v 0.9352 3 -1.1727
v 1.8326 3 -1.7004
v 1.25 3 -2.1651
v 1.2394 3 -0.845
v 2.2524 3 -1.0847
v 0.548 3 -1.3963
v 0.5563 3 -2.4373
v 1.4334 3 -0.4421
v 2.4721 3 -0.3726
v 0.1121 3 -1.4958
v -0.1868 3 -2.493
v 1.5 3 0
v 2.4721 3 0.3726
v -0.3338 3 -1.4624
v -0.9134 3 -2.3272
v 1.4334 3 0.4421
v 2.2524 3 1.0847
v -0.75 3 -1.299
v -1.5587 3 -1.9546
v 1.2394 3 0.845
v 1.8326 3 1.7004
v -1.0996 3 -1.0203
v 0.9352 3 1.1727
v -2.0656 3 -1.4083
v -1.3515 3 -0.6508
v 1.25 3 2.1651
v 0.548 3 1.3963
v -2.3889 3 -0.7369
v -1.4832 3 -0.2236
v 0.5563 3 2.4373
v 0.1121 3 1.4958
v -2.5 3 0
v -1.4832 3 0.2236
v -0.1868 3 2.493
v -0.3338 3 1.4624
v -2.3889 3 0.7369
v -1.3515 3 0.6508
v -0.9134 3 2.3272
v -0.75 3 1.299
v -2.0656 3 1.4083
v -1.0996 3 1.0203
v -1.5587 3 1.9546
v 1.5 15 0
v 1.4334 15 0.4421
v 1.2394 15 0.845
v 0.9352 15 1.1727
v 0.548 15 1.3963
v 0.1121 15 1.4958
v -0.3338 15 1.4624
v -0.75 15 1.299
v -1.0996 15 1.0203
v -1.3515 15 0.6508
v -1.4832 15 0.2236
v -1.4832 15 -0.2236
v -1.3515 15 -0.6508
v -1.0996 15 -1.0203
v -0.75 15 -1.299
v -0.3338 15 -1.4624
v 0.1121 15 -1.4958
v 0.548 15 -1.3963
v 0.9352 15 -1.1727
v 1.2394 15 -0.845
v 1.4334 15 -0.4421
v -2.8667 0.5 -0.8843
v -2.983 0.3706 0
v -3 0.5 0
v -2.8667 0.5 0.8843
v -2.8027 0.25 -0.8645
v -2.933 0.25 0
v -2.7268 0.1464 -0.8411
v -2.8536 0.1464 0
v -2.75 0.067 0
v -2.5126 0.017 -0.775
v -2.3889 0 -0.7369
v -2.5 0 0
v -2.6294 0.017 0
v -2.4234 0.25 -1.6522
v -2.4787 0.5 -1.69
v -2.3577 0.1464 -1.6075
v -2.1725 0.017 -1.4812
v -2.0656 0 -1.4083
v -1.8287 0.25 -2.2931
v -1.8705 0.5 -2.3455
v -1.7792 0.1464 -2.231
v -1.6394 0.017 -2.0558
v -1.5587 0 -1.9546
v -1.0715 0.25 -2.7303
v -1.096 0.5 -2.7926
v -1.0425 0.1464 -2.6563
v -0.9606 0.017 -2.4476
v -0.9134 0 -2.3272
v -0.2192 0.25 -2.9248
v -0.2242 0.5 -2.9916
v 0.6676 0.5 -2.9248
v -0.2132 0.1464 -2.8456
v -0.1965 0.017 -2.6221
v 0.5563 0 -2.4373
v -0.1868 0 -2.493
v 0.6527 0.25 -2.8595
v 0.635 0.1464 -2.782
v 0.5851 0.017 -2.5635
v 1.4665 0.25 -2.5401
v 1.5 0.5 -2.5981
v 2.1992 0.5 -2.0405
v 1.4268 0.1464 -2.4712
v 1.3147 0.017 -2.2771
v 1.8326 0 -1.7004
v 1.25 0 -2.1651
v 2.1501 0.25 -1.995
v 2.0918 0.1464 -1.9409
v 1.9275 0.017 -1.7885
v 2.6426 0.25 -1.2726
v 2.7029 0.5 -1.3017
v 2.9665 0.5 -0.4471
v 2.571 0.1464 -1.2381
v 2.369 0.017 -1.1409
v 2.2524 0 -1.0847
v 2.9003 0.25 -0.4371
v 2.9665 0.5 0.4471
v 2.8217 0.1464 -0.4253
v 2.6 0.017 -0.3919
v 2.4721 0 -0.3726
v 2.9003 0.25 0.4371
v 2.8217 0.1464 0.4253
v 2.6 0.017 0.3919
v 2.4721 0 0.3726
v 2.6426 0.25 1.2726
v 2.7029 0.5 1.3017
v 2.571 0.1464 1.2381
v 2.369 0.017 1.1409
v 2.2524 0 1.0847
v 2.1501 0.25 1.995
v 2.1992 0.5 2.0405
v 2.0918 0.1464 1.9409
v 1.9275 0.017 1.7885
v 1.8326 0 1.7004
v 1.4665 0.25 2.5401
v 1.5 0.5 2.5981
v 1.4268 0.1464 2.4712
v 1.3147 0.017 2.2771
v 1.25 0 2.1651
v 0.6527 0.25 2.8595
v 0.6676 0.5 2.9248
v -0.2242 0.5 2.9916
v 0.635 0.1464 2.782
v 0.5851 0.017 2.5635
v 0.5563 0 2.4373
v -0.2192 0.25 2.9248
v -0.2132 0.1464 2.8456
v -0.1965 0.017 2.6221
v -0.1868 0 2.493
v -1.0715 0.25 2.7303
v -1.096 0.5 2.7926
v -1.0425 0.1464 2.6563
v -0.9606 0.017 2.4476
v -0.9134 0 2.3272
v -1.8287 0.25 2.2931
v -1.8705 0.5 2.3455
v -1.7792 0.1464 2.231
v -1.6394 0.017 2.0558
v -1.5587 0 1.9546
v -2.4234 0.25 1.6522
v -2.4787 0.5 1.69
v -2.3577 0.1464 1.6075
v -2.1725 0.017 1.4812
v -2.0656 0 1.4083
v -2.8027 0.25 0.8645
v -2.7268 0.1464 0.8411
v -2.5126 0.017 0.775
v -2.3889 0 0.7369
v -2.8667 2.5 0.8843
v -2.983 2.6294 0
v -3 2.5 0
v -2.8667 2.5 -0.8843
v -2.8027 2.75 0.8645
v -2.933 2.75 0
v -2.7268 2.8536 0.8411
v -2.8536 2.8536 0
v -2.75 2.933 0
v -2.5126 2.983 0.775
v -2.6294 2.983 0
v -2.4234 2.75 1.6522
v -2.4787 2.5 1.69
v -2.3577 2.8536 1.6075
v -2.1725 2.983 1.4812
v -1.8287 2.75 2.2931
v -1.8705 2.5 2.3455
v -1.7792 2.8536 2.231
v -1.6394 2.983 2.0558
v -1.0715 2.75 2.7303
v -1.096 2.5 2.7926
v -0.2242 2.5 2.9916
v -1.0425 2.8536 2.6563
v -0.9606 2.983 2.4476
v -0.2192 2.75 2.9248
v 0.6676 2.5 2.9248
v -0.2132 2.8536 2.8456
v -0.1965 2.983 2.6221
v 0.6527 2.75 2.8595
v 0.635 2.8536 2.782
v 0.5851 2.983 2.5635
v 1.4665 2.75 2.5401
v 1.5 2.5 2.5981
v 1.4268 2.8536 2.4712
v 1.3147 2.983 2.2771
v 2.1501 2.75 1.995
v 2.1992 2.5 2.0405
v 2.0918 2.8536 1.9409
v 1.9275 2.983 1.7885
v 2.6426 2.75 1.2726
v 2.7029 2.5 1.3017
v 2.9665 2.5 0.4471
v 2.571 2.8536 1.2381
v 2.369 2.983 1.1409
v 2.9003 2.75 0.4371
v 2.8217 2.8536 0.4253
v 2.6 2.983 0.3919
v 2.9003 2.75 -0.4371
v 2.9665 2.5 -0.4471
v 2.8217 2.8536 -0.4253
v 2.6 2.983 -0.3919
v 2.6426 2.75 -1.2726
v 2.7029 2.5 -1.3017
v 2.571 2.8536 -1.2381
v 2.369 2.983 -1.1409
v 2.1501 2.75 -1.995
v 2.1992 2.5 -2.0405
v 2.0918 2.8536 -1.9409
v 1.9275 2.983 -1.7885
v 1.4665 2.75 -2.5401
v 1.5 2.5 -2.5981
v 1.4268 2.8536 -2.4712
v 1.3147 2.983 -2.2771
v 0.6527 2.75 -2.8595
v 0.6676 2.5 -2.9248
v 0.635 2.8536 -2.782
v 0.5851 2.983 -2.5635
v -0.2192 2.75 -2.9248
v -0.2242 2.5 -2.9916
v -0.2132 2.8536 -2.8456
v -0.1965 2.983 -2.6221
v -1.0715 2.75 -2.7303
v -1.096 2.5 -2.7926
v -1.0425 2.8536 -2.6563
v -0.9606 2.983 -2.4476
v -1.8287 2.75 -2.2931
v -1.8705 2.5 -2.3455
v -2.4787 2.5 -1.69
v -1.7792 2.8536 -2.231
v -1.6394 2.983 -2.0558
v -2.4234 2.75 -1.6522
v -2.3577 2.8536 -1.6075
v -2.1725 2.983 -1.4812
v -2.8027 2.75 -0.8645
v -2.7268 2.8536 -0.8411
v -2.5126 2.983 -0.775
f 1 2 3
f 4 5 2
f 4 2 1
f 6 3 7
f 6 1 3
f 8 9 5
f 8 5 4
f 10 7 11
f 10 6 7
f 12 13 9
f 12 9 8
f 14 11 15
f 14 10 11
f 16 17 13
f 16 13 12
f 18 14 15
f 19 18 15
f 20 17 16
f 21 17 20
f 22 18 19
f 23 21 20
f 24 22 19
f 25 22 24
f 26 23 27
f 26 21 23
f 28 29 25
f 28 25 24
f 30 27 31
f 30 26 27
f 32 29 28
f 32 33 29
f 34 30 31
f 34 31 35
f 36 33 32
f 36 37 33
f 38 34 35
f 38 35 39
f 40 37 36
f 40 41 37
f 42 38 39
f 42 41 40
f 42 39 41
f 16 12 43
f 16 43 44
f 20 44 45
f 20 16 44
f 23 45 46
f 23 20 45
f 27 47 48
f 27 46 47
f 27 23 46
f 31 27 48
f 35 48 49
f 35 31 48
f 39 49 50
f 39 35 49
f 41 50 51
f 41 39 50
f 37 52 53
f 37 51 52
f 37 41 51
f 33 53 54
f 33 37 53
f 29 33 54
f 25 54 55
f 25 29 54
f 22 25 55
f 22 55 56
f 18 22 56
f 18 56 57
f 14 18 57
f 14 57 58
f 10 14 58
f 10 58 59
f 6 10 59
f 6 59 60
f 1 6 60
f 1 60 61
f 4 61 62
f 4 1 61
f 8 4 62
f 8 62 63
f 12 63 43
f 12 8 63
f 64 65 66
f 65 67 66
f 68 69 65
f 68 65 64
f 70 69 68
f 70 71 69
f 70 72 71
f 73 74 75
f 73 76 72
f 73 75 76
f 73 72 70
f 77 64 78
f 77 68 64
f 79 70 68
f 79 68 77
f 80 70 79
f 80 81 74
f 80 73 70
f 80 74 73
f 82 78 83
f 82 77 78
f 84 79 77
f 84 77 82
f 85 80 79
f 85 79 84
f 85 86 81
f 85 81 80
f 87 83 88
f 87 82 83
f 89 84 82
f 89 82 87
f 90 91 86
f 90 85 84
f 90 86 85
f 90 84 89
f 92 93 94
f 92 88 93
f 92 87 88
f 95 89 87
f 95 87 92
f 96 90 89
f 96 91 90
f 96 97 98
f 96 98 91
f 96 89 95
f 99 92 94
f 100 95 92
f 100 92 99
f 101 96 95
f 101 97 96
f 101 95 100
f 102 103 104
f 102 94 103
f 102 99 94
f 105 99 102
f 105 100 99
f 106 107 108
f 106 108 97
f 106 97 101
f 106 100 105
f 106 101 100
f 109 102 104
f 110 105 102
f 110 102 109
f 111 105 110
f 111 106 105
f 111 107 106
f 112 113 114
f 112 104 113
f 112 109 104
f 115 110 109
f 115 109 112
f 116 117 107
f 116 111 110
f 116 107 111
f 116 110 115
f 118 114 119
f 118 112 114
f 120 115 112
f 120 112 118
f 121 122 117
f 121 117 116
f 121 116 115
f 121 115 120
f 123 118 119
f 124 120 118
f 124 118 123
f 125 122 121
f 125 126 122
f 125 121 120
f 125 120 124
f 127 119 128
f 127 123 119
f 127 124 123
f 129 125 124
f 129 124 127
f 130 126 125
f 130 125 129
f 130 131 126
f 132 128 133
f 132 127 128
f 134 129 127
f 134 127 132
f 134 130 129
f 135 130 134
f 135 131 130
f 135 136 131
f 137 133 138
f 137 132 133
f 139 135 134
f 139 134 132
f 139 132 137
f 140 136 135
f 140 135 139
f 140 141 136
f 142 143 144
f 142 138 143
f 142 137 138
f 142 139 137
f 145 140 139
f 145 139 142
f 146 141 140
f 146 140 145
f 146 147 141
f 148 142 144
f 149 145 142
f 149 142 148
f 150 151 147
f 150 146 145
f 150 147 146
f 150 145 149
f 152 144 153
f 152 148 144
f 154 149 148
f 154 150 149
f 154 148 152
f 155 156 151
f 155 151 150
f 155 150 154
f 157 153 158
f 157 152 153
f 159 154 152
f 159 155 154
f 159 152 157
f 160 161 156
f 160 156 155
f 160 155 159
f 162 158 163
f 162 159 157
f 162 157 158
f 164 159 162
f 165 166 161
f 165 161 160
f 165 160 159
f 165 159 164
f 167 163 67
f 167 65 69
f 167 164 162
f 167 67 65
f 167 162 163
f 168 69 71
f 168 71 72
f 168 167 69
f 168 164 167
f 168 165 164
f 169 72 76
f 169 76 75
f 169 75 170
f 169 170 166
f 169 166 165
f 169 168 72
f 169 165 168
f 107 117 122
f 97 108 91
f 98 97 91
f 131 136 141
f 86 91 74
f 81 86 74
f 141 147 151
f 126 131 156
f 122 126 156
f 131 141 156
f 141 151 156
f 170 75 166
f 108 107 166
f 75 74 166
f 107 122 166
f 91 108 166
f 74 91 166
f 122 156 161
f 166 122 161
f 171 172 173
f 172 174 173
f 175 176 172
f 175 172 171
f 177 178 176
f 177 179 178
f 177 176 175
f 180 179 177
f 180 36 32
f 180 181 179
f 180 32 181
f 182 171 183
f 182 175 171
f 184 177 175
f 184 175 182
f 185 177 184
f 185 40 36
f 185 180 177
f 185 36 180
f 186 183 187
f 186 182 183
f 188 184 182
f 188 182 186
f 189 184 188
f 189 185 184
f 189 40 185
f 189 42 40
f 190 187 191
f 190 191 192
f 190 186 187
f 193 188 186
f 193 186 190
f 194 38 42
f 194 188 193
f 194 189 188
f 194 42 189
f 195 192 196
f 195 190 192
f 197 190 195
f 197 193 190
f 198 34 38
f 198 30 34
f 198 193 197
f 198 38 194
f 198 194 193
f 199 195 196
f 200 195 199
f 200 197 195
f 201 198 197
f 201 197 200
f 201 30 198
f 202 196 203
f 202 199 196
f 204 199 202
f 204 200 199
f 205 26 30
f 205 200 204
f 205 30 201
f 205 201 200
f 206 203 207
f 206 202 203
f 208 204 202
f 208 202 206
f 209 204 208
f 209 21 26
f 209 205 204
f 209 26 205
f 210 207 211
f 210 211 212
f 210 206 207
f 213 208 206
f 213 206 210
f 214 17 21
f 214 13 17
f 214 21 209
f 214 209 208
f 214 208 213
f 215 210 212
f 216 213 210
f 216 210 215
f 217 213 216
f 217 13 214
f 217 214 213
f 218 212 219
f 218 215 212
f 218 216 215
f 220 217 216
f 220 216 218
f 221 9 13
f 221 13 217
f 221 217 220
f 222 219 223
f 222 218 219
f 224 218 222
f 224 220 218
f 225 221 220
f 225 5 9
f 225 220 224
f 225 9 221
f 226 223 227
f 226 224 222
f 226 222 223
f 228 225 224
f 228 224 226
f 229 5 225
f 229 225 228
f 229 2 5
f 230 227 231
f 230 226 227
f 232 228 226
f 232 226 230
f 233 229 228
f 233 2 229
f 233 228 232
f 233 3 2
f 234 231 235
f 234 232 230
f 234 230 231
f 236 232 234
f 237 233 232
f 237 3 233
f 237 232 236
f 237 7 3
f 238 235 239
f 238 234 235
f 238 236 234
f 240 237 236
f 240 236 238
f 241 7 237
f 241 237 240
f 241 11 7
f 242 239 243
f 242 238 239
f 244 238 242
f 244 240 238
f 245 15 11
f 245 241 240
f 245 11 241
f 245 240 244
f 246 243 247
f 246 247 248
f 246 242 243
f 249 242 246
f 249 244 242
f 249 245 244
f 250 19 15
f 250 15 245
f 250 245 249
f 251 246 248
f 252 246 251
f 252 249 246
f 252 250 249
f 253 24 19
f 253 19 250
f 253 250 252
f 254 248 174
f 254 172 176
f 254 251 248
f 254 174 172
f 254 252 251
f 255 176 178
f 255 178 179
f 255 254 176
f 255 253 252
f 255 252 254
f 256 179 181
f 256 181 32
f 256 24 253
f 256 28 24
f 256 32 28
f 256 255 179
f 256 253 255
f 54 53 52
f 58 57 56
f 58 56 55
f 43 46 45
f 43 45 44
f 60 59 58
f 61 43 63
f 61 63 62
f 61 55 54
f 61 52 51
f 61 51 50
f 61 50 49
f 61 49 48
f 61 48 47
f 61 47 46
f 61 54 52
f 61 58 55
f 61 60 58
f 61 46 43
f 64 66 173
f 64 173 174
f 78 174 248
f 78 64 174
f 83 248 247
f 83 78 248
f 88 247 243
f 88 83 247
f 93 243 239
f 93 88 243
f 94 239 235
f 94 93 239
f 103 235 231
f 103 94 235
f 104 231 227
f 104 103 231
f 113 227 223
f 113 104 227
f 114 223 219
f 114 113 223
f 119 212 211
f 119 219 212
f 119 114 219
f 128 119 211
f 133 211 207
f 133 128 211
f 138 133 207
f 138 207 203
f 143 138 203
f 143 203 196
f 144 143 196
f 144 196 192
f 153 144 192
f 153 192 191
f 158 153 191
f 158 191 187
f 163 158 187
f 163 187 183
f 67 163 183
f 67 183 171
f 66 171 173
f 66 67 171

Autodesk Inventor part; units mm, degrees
ref_plane "YZ Plane" through (0, 0, 0) normal (1, 0, 0) x (0, 1, 0)
ref_plane "XZ Plane" through (0, 0, 0) normal (0, 1, 0) x (-1, 0, 0)
ref_plane "XY Plane" through (0, 0, 0) normal (0, 0, 1) x (1, 0, 0)
sketch "Sketch1" plane through (0, 0, 0) normal (0, 1, 0) x (-1, 0, 0)
  circle A0 centre (0, 0) radius 3
  dimension "d0" = 6
extrude "Extrusion1" add sketch "Sketch1" along normal blind 3
sketch "Sketch2" plane through (0, 3, 0) normal (0, 1, 0) x (1, 0, 0)
  circle A0 centre (0, 0) radius 1.5
  dimension "d3" = 3
extrude "Extrusion2" add sketch "Sketch2" along normal blind 12
fillet "Fillet1" radius 0.5 2 edges at (3, 3, 0) (3, 0, 0)
thread "Thread1" size "M3x0.5" class "6g" standard "ANSI Metric M Profile" full length
properties part number "M3_12mm"
